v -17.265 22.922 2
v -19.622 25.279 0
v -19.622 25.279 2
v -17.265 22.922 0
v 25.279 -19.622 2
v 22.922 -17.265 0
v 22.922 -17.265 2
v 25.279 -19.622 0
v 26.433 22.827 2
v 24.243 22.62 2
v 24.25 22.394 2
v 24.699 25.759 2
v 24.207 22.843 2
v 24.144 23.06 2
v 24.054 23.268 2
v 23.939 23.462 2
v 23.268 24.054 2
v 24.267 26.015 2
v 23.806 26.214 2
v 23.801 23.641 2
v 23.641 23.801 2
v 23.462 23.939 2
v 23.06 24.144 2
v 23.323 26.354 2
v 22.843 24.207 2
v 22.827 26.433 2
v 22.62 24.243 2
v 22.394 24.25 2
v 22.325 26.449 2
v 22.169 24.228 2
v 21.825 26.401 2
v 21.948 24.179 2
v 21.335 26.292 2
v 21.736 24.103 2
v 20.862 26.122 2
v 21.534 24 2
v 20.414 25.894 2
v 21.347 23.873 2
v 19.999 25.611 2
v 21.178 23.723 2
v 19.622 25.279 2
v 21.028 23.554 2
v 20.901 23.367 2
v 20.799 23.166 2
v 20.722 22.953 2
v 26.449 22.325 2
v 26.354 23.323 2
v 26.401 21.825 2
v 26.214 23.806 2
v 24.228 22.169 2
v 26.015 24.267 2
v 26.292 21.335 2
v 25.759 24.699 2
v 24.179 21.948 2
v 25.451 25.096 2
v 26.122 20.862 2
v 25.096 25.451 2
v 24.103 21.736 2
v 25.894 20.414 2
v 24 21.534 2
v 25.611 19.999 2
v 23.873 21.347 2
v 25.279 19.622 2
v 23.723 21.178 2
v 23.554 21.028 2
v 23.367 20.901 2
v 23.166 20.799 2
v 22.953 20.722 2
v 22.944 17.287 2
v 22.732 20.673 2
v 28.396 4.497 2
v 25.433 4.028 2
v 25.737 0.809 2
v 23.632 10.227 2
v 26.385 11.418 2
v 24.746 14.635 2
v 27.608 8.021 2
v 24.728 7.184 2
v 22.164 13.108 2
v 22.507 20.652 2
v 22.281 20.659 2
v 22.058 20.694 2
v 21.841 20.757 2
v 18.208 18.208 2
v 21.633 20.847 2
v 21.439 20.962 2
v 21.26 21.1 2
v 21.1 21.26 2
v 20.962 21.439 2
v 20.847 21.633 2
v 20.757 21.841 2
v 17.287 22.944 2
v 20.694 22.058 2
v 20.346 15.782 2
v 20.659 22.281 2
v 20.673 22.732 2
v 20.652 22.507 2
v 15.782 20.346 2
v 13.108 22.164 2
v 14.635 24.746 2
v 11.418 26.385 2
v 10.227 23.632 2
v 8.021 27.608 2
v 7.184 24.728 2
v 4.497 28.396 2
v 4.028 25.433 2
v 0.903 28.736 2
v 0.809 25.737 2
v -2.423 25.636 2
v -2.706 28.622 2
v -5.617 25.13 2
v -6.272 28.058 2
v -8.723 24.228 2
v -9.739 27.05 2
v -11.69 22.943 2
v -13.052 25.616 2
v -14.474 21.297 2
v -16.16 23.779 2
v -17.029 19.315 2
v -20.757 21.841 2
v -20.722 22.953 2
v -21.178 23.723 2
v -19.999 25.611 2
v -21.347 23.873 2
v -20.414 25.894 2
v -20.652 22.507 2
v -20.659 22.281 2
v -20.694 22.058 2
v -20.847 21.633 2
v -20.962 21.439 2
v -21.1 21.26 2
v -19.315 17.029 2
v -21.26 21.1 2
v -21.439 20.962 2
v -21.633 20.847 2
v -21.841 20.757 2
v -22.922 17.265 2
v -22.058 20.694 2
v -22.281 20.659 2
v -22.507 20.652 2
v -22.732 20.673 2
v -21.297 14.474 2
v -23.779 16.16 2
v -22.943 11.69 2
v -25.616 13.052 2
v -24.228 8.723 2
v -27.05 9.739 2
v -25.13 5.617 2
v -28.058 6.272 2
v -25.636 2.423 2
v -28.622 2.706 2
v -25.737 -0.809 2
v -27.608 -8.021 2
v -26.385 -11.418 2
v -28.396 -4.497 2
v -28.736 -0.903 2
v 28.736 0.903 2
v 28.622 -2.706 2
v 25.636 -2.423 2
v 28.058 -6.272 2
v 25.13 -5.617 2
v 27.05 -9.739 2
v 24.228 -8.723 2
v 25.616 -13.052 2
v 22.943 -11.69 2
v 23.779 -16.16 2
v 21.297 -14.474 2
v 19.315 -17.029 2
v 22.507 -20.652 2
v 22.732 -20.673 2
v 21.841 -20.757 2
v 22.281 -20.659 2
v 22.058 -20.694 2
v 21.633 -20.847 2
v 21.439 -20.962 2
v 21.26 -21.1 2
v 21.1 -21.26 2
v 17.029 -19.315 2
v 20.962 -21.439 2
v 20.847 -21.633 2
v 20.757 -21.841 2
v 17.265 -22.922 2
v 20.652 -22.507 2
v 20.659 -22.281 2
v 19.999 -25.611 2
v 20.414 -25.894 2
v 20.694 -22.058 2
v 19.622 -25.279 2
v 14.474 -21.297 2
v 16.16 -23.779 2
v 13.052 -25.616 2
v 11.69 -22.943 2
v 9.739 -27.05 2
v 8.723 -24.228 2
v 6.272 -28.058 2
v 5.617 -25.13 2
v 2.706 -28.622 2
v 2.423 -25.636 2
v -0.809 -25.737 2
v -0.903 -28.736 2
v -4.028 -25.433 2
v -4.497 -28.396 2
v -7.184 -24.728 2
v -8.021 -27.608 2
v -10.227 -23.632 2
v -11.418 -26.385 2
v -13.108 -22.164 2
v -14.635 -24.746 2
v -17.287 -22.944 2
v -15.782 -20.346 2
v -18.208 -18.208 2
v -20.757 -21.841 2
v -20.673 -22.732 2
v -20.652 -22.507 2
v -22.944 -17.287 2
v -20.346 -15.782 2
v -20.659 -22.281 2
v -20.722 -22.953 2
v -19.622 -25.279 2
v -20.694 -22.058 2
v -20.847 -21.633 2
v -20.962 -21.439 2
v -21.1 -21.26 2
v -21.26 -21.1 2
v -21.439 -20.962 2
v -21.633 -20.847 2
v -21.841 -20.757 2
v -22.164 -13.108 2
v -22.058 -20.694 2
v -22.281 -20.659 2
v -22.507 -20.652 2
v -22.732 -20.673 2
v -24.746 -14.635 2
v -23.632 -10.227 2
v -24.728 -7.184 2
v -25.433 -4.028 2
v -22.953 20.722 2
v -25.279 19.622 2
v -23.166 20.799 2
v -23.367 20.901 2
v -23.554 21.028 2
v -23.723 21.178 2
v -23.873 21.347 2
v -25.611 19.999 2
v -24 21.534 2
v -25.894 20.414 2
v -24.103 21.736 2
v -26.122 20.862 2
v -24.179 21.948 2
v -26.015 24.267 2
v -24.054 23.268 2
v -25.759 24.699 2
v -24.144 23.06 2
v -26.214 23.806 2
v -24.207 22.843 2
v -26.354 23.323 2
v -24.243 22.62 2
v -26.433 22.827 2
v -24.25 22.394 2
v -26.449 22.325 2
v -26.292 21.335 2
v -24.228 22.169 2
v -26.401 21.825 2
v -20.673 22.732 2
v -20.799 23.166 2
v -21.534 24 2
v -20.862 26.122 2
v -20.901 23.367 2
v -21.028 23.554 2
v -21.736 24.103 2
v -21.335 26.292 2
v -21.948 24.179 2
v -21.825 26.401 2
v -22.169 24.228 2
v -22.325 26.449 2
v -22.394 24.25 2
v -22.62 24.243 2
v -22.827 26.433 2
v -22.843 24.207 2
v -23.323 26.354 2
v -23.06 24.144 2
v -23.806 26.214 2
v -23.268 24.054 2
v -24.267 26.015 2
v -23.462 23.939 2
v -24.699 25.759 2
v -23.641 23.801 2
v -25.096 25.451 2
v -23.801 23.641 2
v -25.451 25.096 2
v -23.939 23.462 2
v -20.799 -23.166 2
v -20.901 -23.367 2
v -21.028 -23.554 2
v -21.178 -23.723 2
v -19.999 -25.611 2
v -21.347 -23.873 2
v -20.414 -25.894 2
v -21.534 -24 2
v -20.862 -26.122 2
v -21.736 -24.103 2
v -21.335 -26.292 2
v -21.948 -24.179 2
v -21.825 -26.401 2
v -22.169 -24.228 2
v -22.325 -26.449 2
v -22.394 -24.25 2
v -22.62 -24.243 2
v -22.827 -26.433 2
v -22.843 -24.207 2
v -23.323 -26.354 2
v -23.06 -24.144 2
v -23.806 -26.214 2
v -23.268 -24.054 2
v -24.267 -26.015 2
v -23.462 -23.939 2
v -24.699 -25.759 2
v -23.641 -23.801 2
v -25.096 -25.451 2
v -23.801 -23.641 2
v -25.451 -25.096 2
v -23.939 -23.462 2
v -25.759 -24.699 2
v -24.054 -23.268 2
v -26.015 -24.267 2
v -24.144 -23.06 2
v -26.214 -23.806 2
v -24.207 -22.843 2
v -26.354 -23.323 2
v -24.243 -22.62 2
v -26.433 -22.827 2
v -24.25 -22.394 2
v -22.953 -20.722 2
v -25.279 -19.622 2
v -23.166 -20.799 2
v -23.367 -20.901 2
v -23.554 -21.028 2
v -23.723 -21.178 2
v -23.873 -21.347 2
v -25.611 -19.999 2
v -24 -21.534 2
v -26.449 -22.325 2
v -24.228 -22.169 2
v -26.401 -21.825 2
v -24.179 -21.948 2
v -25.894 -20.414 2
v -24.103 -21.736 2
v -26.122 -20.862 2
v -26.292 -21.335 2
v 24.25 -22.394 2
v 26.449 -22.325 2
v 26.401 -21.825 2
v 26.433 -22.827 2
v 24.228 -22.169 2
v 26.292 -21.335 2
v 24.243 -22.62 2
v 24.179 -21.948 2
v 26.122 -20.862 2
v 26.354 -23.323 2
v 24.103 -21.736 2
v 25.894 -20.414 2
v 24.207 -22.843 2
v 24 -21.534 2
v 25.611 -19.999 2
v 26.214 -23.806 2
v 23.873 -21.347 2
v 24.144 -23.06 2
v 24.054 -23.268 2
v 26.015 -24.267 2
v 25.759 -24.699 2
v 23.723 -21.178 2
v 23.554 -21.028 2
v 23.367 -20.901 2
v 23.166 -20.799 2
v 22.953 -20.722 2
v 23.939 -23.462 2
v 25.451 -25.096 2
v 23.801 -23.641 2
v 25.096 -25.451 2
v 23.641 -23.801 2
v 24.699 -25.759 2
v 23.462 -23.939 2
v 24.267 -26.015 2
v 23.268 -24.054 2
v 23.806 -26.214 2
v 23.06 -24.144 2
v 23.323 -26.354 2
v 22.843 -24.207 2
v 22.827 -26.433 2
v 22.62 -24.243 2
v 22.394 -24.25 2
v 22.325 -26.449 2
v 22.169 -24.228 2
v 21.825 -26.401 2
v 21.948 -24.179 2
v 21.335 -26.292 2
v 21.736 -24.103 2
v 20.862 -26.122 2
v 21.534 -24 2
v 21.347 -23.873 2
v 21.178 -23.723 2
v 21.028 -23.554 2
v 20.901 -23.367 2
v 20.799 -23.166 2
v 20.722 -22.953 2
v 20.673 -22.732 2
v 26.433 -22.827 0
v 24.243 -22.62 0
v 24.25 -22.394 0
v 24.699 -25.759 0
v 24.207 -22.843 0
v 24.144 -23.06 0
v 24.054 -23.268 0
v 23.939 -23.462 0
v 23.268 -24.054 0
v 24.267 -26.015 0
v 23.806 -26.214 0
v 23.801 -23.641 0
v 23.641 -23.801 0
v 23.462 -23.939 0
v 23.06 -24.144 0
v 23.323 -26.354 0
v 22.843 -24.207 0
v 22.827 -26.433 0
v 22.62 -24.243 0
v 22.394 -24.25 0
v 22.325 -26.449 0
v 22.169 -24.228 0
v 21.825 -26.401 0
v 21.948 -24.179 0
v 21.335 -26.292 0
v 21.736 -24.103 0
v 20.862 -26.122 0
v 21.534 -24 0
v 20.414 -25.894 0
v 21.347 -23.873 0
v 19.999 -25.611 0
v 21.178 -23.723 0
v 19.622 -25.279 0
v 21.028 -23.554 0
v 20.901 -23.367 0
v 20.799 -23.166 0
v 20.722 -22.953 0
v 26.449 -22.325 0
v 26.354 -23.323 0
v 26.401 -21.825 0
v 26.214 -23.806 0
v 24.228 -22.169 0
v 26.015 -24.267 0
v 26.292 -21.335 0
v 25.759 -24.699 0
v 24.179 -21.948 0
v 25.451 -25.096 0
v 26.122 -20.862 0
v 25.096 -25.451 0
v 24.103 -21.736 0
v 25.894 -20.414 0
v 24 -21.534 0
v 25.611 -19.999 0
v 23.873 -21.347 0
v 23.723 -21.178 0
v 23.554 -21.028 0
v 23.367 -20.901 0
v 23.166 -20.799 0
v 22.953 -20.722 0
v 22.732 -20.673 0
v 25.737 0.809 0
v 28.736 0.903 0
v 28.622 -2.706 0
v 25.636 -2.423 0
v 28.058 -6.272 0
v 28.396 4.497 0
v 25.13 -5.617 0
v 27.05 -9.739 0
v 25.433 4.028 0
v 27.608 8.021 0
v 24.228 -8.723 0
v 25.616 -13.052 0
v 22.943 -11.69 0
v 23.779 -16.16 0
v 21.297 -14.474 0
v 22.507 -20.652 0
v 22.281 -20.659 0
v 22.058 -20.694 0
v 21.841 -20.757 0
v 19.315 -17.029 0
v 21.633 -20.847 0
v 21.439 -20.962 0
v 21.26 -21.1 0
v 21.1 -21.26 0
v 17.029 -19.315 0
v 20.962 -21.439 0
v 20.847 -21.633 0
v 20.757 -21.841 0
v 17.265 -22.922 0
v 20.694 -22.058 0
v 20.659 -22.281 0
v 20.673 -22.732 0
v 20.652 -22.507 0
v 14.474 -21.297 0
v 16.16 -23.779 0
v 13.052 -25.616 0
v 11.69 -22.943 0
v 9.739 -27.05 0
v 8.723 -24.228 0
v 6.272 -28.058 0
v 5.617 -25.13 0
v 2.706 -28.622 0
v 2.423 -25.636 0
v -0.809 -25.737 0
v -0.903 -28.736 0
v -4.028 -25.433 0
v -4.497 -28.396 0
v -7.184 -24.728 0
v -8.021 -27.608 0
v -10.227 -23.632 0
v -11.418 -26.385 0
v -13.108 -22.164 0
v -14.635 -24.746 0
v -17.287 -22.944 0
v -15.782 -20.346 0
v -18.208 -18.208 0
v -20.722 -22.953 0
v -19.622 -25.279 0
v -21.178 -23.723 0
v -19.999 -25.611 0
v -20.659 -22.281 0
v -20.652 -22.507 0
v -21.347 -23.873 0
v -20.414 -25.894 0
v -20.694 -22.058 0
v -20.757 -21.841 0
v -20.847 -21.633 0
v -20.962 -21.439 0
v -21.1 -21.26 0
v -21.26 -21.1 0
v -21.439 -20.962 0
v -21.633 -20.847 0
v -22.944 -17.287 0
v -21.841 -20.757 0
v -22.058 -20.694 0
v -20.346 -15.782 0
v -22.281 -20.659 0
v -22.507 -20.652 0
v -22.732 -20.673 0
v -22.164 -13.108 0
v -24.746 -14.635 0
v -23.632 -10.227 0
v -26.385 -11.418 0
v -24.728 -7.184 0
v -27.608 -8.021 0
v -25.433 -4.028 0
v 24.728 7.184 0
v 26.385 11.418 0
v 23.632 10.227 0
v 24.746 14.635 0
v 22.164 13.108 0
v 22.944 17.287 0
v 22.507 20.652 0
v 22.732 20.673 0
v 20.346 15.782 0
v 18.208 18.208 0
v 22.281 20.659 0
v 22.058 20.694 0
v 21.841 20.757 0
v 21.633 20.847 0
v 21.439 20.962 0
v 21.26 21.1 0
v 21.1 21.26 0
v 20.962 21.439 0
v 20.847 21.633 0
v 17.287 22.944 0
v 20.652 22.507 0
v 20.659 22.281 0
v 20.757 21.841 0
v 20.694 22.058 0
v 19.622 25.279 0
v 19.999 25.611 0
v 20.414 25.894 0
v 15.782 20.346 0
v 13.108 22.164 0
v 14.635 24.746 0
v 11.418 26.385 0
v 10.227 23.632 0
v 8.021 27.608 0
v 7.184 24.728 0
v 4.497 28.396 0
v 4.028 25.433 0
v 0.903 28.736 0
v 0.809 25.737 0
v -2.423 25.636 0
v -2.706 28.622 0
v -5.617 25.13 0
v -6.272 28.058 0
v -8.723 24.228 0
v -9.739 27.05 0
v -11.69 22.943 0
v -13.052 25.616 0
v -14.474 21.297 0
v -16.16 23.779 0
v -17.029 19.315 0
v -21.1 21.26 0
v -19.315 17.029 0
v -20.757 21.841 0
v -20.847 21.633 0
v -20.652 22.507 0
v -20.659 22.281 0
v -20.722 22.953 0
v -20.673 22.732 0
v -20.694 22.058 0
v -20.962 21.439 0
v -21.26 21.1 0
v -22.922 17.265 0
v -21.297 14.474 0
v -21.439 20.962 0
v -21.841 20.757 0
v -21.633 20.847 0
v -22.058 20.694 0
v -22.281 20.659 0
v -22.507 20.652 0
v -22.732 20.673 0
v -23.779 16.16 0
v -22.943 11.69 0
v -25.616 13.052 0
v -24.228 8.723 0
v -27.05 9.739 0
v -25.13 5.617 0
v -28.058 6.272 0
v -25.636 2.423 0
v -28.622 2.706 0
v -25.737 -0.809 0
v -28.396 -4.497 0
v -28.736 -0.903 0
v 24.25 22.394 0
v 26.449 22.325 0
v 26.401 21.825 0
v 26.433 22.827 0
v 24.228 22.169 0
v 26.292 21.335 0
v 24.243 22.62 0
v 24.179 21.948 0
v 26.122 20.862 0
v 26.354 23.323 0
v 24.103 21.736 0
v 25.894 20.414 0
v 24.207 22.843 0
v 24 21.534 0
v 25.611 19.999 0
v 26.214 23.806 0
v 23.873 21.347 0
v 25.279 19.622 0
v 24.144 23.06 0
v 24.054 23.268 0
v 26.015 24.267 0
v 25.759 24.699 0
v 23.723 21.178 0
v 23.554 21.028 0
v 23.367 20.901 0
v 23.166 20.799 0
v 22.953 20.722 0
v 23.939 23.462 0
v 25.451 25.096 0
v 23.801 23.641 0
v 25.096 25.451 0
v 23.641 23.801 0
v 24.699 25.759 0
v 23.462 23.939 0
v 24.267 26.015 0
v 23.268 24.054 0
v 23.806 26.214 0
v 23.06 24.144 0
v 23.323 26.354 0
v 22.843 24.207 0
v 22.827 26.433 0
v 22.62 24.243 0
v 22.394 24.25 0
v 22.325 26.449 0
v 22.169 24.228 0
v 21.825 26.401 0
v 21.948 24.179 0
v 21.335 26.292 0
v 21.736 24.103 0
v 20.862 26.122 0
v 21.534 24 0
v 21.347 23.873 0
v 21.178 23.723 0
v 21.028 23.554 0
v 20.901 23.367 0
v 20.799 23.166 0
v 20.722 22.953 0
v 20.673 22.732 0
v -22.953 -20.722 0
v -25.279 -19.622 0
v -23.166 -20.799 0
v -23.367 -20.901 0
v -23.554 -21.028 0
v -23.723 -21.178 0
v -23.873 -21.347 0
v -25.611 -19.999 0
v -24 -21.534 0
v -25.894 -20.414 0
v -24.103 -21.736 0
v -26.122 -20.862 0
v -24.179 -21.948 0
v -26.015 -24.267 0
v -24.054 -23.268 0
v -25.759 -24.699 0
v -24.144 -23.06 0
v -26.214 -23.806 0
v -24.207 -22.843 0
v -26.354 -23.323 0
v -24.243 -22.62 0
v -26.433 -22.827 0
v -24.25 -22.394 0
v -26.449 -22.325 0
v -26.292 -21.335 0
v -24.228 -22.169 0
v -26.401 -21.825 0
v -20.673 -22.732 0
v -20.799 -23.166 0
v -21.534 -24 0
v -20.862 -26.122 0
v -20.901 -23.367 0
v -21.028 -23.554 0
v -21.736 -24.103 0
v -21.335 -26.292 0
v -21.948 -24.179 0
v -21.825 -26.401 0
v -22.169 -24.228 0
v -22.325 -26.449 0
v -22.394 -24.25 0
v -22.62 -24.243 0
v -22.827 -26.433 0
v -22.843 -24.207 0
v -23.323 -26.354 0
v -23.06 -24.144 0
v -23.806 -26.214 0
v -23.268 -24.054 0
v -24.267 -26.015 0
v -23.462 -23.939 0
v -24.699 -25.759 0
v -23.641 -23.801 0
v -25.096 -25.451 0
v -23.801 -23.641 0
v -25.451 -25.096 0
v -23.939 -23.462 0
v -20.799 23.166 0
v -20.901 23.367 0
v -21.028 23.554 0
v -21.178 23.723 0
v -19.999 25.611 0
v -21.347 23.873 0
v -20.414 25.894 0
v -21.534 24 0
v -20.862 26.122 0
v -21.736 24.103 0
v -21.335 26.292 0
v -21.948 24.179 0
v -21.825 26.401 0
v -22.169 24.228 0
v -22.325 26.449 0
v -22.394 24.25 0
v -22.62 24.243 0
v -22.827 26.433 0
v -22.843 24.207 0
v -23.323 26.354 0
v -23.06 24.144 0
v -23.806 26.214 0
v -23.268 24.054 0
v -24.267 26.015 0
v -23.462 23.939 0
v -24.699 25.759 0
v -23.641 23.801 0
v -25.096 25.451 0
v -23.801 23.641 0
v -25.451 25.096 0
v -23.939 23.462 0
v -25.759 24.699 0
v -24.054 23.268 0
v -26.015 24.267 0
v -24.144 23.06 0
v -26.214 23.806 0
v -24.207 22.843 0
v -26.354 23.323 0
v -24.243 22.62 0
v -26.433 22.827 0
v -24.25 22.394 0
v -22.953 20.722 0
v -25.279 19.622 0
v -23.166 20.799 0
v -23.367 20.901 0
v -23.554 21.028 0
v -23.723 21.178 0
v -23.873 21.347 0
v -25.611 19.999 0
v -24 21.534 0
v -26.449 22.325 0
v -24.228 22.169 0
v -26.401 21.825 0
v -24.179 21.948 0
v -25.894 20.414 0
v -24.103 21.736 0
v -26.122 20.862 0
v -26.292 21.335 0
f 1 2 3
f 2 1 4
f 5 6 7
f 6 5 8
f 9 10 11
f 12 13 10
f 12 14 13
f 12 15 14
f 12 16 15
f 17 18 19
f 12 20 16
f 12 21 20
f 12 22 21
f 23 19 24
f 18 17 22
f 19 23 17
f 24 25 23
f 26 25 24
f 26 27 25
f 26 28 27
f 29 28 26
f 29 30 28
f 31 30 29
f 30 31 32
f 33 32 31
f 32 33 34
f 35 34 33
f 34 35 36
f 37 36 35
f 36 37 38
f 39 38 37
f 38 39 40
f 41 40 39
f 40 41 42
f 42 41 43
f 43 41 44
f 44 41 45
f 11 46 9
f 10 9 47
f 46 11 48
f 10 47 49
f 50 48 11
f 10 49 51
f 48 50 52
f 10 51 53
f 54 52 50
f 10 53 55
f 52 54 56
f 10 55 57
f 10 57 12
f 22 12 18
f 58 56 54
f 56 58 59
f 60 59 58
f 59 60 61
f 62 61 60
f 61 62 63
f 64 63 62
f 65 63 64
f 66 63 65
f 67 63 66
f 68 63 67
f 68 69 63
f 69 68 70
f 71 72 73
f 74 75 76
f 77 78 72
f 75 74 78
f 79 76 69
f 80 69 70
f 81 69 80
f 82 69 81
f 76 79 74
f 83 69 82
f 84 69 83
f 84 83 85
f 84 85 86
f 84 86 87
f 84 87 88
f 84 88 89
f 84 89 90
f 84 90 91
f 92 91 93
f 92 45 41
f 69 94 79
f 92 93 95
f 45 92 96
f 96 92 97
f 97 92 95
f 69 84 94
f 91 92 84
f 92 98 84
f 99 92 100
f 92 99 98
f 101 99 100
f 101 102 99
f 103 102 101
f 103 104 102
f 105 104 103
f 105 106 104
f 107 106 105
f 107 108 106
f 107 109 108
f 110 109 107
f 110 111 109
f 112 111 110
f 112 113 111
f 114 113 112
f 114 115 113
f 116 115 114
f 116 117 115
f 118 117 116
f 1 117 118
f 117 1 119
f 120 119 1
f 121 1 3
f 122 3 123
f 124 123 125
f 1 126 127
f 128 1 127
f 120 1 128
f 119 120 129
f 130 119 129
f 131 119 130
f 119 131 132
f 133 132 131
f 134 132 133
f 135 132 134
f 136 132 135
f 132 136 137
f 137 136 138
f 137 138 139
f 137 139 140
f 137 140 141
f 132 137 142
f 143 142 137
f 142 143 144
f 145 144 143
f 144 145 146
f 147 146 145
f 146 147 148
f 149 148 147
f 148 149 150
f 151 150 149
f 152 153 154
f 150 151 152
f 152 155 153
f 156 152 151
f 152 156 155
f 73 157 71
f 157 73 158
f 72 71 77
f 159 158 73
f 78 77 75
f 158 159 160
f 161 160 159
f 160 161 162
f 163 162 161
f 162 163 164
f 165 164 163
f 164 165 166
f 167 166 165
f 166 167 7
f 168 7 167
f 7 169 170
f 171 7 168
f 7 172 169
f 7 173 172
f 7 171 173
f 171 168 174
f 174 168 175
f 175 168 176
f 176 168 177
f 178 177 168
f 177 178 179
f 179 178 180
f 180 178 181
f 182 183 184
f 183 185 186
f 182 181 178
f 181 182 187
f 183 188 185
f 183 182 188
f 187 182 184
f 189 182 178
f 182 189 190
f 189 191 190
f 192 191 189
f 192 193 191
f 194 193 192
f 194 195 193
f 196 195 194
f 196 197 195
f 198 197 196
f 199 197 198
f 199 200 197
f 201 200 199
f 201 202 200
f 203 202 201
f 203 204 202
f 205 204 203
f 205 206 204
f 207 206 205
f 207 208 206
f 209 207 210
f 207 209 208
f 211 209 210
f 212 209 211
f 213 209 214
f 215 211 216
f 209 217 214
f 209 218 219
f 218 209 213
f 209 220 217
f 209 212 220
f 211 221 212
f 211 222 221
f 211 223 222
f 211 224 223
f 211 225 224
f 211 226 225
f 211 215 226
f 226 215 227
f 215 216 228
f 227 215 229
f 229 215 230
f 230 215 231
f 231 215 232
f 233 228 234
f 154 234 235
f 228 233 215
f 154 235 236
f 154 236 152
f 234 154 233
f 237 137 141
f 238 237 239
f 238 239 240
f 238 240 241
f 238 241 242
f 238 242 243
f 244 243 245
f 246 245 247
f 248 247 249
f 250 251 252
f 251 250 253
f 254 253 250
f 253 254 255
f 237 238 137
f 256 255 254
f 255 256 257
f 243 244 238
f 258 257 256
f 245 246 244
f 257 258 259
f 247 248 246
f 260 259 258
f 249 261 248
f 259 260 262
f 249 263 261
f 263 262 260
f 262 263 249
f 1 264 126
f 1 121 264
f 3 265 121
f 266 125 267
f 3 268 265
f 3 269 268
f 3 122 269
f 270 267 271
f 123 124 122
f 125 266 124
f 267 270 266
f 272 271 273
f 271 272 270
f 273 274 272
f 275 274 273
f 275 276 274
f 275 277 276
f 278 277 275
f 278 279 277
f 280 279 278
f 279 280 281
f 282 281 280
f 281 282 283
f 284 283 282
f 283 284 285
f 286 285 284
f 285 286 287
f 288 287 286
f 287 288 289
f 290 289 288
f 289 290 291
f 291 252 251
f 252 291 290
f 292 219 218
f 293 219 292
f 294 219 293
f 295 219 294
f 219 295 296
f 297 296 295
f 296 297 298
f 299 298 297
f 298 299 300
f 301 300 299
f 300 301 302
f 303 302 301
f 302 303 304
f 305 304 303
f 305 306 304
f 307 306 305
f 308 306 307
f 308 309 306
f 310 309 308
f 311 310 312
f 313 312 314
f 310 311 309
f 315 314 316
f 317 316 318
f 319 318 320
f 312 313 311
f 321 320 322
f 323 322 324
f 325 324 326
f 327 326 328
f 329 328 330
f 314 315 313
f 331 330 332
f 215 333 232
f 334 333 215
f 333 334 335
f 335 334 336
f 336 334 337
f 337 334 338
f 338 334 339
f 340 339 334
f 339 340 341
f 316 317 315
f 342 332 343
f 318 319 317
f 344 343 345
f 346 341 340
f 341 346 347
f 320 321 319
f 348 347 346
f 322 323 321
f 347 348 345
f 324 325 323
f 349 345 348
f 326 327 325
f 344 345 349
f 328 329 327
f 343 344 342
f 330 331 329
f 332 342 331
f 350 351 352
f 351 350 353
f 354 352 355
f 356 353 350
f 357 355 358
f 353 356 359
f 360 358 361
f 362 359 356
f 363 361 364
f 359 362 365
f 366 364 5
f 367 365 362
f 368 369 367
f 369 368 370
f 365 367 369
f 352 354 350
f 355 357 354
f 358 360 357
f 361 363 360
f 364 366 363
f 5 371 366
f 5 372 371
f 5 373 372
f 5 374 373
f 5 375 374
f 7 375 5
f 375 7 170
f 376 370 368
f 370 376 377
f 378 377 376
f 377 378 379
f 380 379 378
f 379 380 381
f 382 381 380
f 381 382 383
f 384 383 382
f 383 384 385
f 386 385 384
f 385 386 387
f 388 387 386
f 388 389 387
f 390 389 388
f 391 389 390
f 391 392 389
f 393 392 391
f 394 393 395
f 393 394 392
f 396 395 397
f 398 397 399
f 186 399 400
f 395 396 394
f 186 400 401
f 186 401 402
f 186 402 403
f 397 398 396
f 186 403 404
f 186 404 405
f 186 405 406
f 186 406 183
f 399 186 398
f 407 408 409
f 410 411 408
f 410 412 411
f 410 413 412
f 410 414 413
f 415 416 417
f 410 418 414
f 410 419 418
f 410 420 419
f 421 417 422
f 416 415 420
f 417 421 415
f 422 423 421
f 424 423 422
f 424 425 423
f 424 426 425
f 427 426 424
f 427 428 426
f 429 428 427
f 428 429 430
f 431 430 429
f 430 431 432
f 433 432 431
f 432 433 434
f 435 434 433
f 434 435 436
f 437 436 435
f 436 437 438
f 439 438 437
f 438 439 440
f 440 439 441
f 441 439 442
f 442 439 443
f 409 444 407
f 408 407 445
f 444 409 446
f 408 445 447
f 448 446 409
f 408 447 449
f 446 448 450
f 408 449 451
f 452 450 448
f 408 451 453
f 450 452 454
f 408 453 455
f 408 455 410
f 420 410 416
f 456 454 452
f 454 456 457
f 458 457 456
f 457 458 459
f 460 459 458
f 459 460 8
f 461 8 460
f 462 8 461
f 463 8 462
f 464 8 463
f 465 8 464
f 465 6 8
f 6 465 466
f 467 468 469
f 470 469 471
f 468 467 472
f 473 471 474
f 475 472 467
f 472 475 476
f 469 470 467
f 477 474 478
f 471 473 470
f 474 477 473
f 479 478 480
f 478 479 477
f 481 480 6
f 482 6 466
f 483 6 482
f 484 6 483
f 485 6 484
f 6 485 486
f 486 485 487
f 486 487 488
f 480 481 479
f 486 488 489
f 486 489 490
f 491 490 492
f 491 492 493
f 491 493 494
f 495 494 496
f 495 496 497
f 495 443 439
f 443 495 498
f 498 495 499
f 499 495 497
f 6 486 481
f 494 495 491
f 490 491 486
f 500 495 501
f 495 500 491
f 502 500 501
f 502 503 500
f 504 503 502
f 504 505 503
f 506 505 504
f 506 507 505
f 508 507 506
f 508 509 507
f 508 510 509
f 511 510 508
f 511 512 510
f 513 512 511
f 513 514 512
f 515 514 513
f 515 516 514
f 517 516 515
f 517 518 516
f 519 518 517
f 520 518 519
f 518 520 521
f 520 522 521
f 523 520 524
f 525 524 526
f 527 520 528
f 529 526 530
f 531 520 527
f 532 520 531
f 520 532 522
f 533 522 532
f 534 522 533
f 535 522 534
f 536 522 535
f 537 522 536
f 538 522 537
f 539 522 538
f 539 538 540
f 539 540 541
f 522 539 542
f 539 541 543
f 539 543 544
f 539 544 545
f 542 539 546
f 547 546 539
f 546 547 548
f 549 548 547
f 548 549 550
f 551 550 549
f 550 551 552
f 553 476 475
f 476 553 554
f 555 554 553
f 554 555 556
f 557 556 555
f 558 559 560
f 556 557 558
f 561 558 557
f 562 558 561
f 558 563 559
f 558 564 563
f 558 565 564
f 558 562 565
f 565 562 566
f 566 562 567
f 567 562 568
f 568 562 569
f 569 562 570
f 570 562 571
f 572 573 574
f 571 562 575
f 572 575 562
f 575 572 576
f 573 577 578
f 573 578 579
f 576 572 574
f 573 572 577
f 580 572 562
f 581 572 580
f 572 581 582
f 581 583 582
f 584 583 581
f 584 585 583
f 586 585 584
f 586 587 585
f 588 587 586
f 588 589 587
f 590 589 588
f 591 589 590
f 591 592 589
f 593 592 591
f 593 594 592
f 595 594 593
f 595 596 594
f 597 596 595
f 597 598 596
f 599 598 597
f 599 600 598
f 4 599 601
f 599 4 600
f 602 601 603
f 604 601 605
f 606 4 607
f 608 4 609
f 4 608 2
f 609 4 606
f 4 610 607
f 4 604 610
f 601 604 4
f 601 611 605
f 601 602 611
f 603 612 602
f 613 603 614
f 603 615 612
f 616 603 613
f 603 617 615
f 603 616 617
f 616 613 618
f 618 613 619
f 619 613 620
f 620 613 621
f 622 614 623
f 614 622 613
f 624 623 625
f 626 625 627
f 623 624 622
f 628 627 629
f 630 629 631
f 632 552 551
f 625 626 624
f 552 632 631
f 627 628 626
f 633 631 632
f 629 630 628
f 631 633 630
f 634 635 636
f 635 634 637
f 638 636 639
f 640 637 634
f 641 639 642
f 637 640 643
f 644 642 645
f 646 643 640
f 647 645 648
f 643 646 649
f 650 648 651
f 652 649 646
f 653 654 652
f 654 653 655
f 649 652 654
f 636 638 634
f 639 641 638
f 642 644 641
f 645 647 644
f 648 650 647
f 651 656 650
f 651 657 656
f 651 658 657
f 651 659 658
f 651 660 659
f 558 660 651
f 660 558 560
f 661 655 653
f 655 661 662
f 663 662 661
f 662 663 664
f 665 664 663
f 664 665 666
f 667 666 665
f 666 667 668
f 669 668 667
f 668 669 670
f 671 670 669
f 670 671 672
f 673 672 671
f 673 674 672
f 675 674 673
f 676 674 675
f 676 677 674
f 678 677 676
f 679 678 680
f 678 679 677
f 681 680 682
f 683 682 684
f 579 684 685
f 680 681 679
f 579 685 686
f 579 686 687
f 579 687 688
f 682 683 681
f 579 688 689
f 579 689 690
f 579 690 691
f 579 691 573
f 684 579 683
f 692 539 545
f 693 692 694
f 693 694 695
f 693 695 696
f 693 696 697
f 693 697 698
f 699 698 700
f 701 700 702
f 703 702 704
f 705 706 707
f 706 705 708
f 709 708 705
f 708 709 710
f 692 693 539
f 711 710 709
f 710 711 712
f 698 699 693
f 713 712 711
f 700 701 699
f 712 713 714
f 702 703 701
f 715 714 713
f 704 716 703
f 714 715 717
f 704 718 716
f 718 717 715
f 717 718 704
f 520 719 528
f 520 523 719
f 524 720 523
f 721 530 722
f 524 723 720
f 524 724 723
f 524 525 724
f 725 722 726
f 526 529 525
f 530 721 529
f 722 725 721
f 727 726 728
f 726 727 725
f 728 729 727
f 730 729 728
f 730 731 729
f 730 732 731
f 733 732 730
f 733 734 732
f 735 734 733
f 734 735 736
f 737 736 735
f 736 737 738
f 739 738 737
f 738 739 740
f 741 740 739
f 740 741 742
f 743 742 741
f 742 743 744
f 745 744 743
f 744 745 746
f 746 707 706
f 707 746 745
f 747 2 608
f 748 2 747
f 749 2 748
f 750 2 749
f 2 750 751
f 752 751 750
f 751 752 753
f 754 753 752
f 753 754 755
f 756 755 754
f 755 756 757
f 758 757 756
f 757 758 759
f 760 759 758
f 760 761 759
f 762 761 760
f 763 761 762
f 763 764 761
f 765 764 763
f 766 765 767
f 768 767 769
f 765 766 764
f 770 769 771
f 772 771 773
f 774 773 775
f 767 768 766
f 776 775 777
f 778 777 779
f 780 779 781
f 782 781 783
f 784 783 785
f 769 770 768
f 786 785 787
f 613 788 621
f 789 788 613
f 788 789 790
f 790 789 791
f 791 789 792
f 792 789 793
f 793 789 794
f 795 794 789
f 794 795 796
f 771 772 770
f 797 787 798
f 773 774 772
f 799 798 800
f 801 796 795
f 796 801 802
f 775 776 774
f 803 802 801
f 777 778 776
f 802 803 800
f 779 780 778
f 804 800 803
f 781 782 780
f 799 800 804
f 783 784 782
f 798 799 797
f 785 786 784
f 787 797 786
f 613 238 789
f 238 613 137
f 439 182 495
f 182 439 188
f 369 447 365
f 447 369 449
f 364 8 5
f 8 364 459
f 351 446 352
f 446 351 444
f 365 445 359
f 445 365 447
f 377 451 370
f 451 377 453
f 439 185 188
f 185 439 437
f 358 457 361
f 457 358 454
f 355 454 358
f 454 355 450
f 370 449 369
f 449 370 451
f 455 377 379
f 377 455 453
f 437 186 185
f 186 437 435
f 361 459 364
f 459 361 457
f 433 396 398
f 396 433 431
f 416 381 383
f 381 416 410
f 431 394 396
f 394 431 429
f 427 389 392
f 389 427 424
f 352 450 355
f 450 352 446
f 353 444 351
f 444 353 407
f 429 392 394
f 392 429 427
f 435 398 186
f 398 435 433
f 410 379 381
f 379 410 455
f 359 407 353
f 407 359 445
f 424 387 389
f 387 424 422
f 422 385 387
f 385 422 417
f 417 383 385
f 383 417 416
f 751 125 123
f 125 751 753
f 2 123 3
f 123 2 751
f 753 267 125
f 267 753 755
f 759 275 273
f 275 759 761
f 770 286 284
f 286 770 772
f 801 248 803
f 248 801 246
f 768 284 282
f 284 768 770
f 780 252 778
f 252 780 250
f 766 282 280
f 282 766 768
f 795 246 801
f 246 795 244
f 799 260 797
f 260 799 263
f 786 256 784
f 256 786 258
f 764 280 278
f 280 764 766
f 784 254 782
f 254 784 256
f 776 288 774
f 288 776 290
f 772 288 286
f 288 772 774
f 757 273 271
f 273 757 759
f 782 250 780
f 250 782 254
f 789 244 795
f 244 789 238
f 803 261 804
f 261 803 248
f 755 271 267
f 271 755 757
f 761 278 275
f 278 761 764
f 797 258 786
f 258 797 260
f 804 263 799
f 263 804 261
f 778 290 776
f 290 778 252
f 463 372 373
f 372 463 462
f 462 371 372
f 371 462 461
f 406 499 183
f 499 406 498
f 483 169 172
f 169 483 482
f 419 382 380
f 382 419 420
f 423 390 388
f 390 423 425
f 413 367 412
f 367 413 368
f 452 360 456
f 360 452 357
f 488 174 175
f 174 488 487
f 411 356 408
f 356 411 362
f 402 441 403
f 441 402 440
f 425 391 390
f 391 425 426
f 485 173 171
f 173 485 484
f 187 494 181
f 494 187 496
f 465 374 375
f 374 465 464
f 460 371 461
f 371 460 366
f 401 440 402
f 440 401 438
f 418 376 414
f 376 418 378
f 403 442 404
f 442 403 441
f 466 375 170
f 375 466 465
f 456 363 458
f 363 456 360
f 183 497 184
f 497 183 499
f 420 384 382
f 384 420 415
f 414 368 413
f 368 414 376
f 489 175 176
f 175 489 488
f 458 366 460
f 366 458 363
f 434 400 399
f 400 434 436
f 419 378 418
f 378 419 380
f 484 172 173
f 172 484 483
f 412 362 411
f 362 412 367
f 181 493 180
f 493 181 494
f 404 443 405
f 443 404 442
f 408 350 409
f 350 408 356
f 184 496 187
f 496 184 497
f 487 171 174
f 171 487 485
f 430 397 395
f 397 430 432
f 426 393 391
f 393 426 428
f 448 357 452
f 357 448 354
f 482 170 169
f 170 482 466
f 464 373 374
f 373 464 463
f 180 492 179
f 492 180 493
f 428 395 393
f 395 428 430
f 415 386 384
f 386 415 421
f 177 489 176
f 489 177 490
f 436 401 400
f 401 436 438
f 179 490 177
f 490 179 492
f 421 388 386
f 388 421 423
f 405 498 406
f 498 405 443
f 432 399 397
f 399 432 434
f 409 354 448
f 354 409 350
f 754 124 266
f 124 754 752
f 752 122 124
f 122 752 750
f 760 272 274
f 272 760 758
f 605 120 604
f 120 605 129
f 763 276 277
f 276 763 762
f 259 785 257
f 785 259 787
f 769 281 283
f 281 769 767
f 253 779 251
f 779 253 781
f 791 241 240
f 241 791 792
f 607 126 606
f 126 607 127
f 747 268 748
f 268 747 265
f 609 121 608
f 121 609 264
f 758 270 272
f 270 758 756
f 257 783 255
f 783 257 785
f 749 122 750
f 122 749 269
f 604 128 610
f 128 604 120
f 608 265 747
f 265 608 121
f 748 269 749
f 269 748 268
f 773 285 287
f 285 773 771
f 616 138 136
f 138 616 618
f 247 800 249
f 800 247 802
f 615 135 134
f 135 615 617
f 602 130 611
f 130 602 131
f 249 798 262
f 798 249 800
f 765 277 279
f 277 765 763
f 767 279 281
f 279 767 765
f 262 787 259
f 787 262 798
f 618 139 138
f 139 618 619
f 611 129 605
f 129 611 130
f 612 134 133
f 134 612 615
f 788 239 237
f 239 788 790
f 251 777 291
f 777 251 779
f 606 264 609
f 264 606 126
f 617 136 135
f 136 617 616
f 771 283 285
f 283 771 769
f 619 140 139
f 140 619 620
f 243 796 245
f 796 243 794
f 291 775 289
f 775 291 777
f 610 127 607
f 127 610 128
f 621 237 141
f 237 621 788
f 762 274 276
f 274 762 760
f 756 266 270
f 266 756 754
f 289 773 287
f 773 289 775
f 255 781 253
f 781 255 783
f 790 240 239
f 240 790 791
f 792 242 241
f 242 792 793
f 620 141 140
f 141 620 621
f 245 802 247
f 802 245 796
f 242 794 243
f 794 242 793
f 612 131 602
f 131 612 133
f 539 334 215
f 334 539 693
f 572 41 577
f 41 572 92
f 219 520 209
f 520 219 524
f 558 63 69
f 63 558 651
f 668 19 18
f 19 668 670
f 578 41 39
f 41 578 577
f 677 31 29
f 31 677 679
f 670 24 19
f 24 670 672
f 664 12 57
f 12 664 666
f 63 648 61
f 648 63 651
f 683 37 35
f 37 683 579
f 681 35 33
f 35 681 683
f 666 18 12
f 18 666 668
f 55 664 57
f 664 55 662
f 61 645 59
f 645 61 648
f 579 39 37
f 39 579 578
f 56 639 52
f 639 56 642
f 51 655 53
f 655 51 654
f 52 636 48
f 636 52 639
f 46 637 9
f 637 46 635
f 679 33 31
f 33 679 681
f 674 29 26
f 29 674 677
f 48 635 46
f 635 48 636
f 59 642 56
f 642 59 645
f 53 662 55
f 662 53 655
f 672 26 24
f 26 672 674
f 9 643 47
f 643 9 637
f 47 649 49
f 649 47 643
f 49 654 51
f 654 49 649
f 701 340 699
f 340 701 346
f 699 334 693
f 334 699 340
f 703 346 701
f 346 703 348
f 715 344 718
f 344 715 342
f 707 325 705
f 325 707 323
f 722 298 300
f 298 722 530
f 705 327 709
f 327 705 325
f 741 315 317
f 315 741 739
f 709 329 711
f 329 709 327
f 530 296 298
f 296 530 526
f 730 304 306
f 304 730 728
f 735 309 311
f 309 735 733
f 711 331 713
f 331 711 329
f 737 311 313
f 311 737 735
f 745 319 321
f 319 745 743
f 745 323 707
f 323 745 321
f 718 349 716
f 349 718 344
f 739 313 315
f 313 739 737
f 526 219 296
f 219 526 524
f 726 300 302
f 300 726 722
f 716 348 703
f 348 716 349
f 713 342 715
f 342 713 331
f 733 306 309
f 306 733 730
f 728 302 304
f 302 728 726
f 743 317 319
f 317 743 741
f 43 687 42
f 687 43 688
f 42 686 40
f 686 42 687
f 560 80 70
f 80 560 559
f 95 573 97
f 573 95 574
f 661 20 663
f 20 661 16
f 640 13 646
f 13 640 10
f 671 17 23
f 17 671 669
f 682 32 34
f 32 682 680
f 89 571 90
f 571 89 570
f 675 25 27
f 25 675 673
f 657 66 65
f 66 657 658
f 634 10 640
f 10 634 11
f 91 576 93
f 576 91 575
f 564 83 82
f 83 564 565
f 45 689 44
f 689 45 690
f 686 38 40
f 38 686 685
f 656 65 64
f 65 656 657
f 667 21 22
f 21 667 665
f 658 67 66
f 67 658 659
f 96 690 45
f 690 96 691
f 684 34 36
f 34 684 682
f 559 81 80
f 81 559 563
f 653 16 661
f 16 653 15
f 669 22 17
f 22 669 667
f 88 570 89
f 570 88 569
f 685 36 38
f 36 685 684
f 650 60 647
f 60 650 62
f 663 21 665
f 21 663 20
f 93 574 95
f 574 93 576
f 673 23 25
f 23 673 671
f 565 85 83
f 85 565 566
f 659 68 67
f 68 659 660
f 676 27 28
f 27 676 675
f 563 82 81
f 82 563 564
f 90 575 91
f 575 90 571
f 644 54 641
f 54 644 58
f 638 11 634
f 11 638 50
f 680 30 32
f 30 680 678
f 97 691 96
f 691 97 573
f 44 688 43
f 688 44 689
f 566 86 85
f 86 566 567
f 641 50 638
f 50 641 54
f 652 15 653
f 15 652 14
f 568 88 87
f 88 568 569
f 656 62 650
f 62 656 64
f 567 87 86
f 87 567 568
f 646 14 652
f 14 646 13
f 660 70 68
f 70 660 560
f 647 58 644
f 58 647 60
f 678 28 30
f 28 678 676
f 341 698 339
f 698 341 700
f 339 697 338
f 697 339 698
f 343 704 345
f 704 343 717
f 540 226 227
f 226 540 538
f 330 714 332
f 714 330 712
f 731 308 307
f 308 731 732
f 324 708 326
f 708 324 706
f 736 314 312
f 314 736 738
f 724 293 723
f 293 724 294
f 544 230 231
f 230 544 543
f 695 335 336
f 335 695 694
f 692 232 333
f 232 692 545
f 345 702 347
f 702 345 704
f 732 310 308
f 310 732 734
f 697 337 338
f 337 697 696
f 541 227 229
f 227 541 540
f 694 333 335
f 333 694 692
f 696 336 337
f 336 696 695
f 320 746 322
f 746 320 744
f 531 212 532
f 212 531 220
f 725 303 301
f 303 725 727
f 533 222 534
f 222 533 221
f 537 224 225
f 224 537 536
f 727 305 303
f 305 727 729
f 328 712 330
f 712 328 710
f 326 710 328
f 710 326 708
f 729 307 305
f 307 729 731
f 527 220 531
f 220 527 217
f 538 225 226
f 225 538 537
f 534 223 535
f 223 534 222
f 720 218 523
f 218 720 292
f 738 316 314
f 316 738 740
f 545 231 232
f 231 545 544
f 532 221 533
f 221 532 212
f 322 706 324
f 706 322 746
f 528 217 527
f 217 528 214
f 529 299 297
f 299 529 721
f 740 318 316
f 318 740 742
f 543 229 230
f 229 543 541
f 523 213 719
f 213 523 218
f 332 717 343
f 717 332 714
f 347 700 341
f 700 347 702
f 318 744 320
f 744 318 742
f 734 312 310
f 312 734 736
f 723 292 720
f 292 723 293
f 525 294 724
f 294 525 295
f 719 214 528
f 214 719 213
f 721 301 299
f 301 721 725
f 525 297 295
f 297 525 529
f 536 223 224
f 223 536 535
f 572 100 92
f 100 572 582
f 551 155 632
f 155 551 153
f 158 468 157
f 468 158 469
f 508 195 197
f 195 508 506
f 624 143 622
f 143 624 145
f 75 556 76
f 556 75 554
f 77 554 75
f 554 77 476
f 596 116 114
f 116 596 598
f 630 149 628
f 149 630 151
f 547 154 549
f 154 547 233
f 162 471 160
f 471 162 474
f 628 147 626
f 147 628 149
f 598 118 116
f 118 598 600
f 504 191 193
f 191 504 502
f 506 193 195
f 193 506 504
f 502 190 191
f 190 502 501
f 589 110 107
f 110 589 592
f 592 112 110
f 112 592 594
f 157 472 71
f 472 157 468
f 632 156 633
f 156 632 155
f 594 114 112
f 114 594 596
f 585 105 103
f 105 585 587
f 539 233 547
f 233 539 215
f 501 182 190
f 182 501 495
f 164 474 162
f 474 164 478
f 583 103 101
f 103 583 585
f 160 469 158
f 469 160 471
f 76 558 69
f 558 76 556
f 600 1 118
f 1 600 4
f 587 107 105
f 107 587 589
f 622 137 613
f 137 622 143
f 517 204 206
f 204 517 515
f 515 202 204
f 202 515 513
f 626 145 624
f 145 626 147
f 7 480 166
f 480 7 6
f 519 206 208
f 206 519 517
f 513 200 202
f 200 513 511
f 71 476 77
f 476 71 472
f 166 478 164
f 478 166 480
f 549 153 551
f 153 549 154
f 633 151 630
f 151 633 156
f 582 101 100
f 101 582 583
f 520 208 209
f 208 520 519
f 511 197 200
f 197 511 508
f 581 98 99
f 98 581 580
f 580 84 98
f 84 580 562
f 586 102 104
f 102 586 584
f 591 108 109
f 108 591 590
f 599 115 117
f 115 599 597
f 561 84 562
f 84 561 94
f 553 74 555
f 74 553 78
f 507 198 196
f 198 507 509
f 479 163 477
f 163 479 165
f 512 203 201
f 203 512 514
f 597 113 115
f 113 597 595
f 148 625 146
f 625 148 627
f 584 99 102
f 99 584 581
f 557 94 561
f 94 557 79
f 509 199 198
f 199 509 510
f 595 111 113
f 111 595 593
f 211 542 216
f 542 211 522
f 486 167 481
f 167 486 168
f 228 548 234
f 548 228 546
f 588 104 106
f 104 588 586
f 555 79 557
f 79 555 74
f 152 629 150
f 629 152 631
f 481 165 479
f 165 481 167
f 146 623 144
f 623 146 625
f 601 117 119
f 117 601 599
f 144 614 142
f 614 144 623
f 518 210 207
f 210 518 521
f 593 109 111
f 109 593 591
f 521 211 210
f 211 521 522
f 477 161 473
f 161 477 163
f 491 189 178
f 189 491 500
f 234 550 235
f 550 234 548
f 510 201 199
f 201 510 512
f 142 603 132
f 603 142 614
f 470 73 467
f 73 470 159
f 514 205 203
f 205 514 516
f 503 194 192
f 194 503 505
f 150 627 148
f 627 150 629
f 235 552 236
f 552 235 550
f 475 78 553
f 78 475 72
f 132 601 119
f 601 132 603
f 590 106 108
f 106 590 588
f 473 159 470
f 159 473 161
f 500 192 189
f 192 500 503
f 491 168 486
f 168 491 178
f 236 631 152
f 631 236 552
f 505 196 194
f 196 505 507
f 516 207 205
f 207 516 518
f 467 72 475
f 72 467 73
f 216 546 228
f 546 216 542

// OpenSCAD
$fn = 50;
cover_thickness = 2;
tube_thickness = 2;
pcb_disk_r = 53.5/2;
cover_disk_r = 54.5/2;
cover_r = pcb_disk_r+tube_thickness;
peg_thickness = 2;

module stick_with_holes() {
  clen = 5;
  cwidth = 8;
  translate([-cwidth/2, -pcb_disk_r-clen, 0]) {
   difference() {
      union() {
        cube([cwidth, (pcb_disk_r + clen) * 2, cover_thickness]);
        translate([cwidth/2, 0,  0]) {
          cylinder(r=cwidth/2, h=cover_thickness);
        }
        translate([cwidth/2, (pcb_disk_r+clen)*2,  0]) {
          cylinder(r=cwidth/2, h=cover_thickness);
        }
      }
      translate([cwidth/2, 0,  0]) {
        cylinder(r=1.8, h=cover_thickness);
      }
      translate([cwidth/2, (pcb_disk_r+clen)*2,  0]) {
        cylinder(r=1.8, h=cover_thickness);
      }
    }
  }
}


translate([0, 0, 0]) {
  rotate(45) {
    difference() {
      union() {
        cylinder(h=cover_thickness, r=cover_r);
        stick_with_holes();
        rotate(90) {
          stick_with_holes();
        }
      }
      cylinder(h=cover_thickness, r=pcb_disk_r-1);
    }
  }
}
